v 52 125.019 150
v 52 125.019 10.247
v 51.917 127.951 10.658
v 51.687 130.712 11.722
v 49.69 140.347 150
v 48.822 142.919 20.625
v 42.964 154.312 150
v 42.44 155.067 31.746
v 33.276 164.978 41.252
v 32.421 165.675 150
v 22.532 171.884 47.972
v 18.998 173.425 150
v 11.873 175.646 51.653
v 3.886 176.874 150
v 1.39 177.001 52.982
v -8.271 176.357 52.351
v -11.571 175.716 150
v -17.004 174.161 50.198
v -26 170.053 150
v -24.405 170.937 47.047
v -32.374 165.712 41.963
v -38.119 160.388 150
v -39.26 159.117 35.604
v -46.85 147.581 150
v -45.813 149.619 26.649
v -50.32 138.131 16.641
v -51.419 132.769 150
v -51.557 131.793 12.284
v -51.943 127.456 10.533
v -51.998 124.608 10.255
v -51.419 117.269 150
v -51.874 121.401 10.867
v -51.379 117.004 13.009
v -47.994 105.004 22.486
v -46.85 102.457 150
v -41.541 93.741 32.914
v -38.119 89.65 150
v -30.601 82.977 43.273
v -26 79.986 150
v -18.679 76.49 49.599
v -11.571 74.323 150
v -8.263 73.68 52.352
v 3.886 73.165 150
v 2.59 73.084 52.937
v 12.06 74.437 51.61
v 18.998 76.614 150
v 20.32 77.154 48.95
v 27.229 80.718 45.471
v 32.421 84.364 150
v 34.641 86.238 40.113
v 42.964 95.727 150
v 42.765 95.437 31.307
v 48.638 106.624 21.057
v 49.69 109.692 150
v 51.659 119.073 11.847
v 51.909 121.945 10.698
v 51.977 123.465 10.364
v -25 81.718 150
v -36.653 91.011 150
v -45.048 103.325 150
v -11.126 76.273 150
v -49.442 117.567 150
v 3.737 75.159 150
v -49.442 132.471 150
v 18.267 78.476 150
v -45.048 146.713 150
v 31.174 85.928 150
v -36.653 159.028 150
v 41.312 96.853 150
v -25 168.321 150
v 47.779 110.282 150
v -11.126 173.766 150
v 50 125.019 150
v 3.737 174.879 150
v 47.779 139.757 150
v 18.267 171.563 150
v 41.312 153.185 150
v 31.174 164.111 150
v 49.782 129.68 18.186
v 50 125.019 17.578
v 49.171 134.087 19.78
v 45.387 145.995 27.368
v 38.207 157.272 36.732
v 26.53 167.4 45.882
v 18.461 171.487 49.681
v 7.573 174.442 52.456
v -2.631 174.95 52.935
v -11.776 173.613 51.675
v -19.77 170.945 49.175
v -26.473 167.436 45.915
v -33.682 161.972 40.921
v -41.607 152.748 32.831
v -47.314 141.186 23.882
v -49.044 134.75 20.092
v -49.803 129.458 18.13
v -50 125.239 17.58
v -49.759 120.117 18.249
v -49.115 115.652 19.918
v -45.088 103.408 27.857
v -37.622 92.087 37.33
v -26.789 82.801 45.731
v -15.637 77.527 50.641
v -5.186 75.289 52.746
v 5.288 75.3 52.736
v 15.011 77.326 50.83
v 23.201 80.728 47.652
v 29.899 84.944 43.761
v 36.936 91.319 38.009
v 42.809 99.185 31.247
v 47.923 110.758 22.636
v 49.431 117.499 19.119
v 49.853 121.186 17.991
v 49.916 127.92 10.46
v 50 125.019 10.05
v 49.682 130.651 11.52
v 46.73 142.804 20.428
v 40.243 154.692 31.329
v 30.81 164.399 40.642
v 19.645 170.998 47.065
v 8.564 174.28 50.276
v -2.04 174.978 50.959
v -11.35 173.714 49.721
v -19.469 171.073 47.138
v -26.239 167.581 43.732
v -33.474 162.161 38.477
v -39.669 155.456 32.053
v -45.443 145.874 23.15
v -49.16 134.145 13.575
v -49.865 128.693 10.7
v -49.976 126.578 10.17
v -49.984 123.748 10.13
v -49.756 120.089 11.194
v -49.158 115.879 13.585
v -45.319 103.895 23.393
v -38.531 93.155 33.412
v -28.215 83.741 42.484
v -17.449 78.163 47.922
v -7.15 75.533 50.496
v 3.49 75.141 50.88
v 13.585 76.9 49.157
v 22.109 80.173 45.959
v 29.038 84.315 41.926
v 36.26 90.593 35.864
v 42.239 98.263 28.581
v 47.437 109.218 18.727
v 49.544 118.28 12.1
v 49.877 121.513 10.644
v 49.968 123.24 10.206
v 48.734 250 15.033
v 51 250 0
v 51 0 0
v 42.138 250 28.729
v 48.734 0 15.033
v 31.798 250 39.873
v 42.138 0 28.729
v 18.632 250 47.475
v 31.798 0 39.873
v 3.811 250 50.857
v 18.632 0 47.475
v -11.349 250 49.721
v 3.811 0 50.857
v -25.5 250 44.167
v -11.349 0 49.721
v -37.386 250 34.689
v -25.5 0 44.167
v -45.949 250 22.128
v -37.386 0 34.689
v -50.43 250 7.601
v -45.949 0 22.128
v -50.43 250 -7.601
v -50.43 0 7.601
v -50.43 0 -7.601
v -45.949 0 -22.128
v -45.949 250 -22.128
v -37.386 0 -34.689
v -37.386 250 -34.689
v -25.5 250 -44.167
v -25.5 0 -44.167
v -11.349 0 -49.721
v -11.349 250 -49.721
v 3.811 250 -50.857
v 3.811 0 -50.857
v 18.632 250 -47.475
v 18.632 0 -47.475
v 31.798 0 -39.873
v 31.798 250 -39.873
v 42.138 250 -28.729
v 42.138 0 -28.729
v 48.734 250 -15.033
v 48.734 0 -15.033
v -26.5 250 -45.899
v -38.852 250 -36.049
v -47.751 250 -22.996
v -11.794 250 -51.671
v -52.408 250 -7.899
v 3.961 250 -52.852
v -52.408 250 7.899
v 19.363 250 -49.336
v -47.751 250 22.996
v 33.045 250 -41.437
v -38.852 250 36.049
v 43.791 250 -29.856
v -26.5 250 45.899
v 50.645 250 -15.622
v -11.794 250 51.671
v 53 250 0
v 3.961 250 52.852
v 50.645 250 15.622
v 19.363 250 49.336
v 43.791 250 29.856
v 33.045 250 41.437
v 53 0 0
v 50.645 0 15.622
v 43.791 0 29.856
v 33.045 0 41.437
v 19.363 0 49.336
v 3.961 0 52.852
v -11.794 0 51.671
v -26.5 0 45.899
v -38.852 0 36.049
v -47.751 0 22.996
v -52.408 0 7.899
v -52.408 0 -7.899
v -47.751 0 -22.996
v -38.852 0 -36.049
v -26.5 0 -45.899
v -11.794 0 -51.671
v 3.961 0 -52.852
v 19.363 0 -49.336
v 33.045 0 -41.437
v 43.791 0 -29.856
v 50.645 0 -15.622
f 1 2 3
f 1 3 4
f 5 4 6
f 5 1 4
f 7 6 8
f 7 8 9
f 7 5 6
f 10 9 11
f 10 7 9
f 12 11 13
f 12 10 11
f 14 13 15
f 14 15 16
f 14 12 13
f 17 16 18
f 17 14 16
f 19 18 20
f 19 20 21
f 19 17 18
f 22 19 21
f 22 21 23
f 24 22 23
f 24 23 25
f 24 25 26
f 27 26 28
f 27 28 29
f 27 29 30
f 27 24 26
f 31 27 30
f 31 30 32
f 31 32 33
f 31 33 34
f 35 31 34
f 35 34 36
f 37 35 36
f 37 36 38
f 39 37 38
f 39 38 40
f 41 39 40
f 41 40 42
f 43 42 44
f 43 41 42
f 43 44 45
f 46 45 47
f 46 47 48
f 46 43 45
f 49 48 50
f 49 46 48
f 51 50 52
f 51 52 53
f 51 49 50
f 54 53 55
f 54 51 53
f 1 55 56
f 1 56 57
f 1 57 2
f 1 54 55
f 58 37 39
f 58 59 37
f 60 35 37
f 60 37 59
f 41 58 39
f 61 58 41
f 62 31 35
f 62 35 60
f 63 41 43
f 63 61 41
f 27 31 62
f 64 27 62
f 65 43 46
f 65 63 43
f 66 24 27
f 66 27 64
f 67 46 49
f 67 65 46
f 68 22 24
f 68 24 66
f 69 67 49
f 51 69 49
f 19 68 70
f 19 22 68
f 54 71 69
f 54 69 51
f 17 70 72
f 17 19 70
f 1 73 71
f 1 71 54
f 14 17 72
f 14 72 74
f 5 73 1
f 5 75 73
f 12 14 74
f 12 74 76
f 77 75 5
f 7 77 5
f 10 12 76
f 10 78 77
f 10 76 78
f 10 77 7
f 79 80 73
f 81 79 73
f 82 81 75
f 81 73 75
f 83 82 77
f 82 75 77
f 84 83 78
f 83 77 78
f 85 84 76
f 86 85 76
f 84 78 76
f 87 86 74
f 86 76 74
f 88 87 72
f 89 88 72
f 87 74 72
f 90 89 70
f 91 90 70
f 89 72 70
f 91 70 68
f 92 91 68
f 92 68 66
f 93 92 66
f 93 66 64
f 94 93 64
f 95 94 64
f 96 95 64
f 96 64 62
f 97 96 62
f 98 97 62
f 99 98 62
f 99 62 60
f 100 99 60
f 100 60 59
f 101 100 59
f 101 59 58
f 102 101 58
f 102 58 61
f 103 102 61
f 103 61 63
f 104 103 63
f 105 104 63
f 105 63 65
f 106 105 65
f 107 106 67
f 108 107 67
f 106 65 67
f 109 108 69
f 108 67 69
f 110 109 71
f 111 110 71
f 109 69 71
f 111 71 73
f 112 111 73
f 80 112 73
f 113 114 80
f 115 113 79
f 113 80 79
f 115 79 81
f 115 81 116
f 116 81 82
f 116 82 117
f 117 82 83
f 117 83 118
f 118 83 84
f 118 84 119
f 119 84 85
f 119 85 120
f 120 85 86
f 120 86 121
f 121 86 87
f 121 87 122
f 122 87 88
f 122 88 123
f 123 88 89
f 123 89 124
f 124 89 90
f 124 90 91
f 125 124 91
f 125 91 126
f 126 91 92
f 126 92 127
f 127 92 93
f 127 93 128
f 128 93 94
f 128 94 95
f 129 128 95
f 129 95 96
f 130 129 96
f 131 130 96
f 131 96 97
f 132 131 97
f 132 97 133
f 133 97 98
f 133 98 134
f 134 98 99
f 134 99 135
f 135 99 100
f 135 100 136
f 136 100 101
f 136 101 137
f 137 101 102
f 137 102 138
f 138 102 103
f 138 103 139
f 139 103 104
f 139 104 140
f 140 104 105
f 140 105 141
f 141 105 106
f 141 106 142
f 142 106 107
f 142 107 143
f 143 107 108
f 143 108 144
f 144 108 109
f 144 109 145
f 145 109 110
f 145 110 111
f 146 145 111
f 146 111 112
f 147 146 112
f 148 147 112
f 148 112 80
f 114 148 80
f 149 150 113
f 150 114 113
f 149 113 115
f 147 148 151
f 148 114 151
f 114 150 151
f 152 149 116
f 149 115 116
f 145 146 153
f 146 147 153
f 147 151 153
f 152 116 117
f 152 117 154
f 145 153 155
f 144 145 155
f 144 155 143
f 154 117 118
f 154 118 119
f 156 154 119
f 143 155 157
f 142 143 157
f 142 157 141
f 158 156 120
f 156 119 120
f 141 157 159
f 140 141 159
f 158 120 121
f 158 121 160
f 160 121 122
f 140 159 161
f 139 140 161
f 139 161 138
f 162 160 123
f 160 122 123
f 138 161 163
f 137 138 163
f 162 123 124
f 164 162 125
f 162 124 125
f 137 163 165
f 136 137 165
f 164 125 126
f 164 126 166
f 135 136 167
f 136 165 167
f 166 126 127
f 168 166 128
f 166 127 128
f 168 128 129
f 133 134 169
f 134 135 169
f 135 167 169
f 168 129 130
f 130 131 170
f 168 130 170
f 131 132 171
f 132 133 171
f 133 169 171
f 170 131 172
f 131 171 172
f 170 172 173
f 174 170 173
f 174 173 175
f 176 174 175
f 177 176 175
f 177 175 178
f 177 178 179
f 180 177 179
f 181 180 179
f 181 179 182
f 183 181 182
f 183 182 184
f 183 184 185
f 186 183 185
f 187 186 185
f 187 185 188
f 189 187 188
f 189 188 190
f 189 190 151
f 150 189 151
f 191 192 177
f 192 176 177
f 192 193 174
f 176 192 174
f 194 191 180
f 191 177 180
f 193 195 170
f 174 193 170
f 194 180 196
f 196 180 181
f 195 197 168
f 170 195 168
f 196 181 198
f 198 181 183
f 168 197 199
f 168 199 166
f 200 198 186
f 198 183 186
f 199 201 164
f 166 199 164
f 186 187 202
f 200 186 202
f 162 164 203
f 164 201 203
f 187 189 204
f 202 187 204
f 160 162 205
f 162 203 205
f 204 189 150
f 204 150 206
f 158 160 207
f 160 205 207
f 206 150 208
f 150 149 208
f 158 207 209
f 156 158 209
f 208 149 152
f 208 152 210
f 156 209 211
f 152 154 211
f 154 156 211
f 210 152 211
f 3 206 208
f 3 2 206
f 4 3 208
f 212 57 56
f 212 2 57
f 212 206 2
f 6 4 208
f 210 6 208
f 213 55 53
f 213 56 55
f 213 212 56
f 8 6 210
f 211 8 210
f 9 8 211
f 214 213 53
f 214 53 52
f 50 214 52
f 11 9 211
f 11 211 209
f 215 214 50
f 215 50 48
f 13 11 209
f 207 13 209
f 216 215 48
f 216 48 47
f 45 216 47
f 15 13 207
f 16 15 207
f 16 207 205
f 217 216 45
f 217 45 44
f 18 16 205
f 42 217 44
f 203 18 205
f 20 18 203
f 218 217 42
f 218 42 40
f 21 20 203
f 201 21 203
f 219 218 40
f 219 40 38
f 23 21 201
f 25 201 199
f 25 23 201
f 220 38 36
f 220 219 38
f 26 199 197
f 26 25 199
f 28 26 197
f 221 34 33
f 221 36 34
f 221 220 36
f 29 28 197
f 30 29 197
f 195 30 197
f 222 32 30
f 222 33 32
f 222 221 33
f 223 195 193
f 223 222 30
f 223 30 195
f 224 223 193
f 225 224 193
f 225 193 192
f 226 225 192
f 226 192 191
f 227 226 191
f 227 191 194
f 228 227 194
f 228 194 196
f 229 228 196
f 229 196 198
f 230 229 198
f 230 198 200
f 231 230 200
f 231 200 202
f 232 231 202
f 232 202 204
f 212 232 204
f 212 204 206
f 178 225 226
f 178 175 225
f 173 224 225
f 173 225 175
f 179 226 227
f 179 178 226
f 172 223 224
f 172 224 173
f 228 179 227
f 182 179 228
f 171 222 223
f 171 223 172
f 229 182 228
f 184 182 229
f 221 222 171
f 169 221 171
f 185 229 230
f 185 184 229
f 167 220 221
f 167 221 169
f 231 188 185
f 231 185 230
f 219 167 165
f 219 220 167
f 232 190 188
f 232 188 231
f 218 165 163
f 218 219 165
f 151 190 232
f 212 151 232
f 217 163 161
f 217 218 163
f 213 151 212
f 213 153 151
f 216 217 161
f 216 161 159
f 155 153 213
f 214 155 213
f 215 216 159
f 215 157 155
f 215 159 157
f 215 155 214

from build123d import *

# Parameters (mm, degrees)
F0_R     = 53
F0_R_2   = 51
F1_DEPTH = 250
F3_R     = 52
F3_R_2   = 50
F4_REACH = 350.0792104868
F5_R     = 50
F6_REACH = 344.4223563373


with BuildPart() as f1:
    # F0 (on Front) → F1 (new body)
    with BuildSketch(Plane.XZ):
        Circle(F0_R)
        Circle(F0_R_2, mode=Mode.SUBTRACT)
    extrude(amount=-F1_DEPTH)

    f4_end = f1.faces().sort_by_distance((-53, 125, 0))[0]
    # F3 (on offset) → F4 (join, up to a face of the model that its end follows)
    with BuildSketch(Plane.XY.offset(150)):
        with Locations((0, 125.0192821026)):
            Circle(F3_R)
        with Locations((0, 125.0192821026)):
            Circle(F3_R_2, mode=Mode.SUBTRACT)
    f4_long = extrude(amount=-F4_REACH, mode=Mode.PRIVATE)
    add(split(f4_long, bisect_by=f4_end, keep=Keep.ALL, mode=Mode.PRIVATE).solids().sort_by_distance((-50.5292178951, 125.0192821026, 150))[0])

    f6_end = f1.faces().sort_by_distance((-51, 125, 0))[0]
    # F5 (on offset) → F6 (cut, up to a face of the model that its end follows)
    with BuildSketch(Plane.XY.offset(150)):
        with Locations((0, 125.0192821026)):
            Circle(F5_R)
    f6_long = extrude(amount=-F6_REACH, mode=Mode.PRIVATE)
    add(split(f6_long, bisect_by=f6_end, keep=Keep.ALL, mode=Mode.PRIVATE).solids().sort_by_distance((0, 125.0192821026, 150))[0], mode=Mode.SUBTRACT)


solid = f1.part
